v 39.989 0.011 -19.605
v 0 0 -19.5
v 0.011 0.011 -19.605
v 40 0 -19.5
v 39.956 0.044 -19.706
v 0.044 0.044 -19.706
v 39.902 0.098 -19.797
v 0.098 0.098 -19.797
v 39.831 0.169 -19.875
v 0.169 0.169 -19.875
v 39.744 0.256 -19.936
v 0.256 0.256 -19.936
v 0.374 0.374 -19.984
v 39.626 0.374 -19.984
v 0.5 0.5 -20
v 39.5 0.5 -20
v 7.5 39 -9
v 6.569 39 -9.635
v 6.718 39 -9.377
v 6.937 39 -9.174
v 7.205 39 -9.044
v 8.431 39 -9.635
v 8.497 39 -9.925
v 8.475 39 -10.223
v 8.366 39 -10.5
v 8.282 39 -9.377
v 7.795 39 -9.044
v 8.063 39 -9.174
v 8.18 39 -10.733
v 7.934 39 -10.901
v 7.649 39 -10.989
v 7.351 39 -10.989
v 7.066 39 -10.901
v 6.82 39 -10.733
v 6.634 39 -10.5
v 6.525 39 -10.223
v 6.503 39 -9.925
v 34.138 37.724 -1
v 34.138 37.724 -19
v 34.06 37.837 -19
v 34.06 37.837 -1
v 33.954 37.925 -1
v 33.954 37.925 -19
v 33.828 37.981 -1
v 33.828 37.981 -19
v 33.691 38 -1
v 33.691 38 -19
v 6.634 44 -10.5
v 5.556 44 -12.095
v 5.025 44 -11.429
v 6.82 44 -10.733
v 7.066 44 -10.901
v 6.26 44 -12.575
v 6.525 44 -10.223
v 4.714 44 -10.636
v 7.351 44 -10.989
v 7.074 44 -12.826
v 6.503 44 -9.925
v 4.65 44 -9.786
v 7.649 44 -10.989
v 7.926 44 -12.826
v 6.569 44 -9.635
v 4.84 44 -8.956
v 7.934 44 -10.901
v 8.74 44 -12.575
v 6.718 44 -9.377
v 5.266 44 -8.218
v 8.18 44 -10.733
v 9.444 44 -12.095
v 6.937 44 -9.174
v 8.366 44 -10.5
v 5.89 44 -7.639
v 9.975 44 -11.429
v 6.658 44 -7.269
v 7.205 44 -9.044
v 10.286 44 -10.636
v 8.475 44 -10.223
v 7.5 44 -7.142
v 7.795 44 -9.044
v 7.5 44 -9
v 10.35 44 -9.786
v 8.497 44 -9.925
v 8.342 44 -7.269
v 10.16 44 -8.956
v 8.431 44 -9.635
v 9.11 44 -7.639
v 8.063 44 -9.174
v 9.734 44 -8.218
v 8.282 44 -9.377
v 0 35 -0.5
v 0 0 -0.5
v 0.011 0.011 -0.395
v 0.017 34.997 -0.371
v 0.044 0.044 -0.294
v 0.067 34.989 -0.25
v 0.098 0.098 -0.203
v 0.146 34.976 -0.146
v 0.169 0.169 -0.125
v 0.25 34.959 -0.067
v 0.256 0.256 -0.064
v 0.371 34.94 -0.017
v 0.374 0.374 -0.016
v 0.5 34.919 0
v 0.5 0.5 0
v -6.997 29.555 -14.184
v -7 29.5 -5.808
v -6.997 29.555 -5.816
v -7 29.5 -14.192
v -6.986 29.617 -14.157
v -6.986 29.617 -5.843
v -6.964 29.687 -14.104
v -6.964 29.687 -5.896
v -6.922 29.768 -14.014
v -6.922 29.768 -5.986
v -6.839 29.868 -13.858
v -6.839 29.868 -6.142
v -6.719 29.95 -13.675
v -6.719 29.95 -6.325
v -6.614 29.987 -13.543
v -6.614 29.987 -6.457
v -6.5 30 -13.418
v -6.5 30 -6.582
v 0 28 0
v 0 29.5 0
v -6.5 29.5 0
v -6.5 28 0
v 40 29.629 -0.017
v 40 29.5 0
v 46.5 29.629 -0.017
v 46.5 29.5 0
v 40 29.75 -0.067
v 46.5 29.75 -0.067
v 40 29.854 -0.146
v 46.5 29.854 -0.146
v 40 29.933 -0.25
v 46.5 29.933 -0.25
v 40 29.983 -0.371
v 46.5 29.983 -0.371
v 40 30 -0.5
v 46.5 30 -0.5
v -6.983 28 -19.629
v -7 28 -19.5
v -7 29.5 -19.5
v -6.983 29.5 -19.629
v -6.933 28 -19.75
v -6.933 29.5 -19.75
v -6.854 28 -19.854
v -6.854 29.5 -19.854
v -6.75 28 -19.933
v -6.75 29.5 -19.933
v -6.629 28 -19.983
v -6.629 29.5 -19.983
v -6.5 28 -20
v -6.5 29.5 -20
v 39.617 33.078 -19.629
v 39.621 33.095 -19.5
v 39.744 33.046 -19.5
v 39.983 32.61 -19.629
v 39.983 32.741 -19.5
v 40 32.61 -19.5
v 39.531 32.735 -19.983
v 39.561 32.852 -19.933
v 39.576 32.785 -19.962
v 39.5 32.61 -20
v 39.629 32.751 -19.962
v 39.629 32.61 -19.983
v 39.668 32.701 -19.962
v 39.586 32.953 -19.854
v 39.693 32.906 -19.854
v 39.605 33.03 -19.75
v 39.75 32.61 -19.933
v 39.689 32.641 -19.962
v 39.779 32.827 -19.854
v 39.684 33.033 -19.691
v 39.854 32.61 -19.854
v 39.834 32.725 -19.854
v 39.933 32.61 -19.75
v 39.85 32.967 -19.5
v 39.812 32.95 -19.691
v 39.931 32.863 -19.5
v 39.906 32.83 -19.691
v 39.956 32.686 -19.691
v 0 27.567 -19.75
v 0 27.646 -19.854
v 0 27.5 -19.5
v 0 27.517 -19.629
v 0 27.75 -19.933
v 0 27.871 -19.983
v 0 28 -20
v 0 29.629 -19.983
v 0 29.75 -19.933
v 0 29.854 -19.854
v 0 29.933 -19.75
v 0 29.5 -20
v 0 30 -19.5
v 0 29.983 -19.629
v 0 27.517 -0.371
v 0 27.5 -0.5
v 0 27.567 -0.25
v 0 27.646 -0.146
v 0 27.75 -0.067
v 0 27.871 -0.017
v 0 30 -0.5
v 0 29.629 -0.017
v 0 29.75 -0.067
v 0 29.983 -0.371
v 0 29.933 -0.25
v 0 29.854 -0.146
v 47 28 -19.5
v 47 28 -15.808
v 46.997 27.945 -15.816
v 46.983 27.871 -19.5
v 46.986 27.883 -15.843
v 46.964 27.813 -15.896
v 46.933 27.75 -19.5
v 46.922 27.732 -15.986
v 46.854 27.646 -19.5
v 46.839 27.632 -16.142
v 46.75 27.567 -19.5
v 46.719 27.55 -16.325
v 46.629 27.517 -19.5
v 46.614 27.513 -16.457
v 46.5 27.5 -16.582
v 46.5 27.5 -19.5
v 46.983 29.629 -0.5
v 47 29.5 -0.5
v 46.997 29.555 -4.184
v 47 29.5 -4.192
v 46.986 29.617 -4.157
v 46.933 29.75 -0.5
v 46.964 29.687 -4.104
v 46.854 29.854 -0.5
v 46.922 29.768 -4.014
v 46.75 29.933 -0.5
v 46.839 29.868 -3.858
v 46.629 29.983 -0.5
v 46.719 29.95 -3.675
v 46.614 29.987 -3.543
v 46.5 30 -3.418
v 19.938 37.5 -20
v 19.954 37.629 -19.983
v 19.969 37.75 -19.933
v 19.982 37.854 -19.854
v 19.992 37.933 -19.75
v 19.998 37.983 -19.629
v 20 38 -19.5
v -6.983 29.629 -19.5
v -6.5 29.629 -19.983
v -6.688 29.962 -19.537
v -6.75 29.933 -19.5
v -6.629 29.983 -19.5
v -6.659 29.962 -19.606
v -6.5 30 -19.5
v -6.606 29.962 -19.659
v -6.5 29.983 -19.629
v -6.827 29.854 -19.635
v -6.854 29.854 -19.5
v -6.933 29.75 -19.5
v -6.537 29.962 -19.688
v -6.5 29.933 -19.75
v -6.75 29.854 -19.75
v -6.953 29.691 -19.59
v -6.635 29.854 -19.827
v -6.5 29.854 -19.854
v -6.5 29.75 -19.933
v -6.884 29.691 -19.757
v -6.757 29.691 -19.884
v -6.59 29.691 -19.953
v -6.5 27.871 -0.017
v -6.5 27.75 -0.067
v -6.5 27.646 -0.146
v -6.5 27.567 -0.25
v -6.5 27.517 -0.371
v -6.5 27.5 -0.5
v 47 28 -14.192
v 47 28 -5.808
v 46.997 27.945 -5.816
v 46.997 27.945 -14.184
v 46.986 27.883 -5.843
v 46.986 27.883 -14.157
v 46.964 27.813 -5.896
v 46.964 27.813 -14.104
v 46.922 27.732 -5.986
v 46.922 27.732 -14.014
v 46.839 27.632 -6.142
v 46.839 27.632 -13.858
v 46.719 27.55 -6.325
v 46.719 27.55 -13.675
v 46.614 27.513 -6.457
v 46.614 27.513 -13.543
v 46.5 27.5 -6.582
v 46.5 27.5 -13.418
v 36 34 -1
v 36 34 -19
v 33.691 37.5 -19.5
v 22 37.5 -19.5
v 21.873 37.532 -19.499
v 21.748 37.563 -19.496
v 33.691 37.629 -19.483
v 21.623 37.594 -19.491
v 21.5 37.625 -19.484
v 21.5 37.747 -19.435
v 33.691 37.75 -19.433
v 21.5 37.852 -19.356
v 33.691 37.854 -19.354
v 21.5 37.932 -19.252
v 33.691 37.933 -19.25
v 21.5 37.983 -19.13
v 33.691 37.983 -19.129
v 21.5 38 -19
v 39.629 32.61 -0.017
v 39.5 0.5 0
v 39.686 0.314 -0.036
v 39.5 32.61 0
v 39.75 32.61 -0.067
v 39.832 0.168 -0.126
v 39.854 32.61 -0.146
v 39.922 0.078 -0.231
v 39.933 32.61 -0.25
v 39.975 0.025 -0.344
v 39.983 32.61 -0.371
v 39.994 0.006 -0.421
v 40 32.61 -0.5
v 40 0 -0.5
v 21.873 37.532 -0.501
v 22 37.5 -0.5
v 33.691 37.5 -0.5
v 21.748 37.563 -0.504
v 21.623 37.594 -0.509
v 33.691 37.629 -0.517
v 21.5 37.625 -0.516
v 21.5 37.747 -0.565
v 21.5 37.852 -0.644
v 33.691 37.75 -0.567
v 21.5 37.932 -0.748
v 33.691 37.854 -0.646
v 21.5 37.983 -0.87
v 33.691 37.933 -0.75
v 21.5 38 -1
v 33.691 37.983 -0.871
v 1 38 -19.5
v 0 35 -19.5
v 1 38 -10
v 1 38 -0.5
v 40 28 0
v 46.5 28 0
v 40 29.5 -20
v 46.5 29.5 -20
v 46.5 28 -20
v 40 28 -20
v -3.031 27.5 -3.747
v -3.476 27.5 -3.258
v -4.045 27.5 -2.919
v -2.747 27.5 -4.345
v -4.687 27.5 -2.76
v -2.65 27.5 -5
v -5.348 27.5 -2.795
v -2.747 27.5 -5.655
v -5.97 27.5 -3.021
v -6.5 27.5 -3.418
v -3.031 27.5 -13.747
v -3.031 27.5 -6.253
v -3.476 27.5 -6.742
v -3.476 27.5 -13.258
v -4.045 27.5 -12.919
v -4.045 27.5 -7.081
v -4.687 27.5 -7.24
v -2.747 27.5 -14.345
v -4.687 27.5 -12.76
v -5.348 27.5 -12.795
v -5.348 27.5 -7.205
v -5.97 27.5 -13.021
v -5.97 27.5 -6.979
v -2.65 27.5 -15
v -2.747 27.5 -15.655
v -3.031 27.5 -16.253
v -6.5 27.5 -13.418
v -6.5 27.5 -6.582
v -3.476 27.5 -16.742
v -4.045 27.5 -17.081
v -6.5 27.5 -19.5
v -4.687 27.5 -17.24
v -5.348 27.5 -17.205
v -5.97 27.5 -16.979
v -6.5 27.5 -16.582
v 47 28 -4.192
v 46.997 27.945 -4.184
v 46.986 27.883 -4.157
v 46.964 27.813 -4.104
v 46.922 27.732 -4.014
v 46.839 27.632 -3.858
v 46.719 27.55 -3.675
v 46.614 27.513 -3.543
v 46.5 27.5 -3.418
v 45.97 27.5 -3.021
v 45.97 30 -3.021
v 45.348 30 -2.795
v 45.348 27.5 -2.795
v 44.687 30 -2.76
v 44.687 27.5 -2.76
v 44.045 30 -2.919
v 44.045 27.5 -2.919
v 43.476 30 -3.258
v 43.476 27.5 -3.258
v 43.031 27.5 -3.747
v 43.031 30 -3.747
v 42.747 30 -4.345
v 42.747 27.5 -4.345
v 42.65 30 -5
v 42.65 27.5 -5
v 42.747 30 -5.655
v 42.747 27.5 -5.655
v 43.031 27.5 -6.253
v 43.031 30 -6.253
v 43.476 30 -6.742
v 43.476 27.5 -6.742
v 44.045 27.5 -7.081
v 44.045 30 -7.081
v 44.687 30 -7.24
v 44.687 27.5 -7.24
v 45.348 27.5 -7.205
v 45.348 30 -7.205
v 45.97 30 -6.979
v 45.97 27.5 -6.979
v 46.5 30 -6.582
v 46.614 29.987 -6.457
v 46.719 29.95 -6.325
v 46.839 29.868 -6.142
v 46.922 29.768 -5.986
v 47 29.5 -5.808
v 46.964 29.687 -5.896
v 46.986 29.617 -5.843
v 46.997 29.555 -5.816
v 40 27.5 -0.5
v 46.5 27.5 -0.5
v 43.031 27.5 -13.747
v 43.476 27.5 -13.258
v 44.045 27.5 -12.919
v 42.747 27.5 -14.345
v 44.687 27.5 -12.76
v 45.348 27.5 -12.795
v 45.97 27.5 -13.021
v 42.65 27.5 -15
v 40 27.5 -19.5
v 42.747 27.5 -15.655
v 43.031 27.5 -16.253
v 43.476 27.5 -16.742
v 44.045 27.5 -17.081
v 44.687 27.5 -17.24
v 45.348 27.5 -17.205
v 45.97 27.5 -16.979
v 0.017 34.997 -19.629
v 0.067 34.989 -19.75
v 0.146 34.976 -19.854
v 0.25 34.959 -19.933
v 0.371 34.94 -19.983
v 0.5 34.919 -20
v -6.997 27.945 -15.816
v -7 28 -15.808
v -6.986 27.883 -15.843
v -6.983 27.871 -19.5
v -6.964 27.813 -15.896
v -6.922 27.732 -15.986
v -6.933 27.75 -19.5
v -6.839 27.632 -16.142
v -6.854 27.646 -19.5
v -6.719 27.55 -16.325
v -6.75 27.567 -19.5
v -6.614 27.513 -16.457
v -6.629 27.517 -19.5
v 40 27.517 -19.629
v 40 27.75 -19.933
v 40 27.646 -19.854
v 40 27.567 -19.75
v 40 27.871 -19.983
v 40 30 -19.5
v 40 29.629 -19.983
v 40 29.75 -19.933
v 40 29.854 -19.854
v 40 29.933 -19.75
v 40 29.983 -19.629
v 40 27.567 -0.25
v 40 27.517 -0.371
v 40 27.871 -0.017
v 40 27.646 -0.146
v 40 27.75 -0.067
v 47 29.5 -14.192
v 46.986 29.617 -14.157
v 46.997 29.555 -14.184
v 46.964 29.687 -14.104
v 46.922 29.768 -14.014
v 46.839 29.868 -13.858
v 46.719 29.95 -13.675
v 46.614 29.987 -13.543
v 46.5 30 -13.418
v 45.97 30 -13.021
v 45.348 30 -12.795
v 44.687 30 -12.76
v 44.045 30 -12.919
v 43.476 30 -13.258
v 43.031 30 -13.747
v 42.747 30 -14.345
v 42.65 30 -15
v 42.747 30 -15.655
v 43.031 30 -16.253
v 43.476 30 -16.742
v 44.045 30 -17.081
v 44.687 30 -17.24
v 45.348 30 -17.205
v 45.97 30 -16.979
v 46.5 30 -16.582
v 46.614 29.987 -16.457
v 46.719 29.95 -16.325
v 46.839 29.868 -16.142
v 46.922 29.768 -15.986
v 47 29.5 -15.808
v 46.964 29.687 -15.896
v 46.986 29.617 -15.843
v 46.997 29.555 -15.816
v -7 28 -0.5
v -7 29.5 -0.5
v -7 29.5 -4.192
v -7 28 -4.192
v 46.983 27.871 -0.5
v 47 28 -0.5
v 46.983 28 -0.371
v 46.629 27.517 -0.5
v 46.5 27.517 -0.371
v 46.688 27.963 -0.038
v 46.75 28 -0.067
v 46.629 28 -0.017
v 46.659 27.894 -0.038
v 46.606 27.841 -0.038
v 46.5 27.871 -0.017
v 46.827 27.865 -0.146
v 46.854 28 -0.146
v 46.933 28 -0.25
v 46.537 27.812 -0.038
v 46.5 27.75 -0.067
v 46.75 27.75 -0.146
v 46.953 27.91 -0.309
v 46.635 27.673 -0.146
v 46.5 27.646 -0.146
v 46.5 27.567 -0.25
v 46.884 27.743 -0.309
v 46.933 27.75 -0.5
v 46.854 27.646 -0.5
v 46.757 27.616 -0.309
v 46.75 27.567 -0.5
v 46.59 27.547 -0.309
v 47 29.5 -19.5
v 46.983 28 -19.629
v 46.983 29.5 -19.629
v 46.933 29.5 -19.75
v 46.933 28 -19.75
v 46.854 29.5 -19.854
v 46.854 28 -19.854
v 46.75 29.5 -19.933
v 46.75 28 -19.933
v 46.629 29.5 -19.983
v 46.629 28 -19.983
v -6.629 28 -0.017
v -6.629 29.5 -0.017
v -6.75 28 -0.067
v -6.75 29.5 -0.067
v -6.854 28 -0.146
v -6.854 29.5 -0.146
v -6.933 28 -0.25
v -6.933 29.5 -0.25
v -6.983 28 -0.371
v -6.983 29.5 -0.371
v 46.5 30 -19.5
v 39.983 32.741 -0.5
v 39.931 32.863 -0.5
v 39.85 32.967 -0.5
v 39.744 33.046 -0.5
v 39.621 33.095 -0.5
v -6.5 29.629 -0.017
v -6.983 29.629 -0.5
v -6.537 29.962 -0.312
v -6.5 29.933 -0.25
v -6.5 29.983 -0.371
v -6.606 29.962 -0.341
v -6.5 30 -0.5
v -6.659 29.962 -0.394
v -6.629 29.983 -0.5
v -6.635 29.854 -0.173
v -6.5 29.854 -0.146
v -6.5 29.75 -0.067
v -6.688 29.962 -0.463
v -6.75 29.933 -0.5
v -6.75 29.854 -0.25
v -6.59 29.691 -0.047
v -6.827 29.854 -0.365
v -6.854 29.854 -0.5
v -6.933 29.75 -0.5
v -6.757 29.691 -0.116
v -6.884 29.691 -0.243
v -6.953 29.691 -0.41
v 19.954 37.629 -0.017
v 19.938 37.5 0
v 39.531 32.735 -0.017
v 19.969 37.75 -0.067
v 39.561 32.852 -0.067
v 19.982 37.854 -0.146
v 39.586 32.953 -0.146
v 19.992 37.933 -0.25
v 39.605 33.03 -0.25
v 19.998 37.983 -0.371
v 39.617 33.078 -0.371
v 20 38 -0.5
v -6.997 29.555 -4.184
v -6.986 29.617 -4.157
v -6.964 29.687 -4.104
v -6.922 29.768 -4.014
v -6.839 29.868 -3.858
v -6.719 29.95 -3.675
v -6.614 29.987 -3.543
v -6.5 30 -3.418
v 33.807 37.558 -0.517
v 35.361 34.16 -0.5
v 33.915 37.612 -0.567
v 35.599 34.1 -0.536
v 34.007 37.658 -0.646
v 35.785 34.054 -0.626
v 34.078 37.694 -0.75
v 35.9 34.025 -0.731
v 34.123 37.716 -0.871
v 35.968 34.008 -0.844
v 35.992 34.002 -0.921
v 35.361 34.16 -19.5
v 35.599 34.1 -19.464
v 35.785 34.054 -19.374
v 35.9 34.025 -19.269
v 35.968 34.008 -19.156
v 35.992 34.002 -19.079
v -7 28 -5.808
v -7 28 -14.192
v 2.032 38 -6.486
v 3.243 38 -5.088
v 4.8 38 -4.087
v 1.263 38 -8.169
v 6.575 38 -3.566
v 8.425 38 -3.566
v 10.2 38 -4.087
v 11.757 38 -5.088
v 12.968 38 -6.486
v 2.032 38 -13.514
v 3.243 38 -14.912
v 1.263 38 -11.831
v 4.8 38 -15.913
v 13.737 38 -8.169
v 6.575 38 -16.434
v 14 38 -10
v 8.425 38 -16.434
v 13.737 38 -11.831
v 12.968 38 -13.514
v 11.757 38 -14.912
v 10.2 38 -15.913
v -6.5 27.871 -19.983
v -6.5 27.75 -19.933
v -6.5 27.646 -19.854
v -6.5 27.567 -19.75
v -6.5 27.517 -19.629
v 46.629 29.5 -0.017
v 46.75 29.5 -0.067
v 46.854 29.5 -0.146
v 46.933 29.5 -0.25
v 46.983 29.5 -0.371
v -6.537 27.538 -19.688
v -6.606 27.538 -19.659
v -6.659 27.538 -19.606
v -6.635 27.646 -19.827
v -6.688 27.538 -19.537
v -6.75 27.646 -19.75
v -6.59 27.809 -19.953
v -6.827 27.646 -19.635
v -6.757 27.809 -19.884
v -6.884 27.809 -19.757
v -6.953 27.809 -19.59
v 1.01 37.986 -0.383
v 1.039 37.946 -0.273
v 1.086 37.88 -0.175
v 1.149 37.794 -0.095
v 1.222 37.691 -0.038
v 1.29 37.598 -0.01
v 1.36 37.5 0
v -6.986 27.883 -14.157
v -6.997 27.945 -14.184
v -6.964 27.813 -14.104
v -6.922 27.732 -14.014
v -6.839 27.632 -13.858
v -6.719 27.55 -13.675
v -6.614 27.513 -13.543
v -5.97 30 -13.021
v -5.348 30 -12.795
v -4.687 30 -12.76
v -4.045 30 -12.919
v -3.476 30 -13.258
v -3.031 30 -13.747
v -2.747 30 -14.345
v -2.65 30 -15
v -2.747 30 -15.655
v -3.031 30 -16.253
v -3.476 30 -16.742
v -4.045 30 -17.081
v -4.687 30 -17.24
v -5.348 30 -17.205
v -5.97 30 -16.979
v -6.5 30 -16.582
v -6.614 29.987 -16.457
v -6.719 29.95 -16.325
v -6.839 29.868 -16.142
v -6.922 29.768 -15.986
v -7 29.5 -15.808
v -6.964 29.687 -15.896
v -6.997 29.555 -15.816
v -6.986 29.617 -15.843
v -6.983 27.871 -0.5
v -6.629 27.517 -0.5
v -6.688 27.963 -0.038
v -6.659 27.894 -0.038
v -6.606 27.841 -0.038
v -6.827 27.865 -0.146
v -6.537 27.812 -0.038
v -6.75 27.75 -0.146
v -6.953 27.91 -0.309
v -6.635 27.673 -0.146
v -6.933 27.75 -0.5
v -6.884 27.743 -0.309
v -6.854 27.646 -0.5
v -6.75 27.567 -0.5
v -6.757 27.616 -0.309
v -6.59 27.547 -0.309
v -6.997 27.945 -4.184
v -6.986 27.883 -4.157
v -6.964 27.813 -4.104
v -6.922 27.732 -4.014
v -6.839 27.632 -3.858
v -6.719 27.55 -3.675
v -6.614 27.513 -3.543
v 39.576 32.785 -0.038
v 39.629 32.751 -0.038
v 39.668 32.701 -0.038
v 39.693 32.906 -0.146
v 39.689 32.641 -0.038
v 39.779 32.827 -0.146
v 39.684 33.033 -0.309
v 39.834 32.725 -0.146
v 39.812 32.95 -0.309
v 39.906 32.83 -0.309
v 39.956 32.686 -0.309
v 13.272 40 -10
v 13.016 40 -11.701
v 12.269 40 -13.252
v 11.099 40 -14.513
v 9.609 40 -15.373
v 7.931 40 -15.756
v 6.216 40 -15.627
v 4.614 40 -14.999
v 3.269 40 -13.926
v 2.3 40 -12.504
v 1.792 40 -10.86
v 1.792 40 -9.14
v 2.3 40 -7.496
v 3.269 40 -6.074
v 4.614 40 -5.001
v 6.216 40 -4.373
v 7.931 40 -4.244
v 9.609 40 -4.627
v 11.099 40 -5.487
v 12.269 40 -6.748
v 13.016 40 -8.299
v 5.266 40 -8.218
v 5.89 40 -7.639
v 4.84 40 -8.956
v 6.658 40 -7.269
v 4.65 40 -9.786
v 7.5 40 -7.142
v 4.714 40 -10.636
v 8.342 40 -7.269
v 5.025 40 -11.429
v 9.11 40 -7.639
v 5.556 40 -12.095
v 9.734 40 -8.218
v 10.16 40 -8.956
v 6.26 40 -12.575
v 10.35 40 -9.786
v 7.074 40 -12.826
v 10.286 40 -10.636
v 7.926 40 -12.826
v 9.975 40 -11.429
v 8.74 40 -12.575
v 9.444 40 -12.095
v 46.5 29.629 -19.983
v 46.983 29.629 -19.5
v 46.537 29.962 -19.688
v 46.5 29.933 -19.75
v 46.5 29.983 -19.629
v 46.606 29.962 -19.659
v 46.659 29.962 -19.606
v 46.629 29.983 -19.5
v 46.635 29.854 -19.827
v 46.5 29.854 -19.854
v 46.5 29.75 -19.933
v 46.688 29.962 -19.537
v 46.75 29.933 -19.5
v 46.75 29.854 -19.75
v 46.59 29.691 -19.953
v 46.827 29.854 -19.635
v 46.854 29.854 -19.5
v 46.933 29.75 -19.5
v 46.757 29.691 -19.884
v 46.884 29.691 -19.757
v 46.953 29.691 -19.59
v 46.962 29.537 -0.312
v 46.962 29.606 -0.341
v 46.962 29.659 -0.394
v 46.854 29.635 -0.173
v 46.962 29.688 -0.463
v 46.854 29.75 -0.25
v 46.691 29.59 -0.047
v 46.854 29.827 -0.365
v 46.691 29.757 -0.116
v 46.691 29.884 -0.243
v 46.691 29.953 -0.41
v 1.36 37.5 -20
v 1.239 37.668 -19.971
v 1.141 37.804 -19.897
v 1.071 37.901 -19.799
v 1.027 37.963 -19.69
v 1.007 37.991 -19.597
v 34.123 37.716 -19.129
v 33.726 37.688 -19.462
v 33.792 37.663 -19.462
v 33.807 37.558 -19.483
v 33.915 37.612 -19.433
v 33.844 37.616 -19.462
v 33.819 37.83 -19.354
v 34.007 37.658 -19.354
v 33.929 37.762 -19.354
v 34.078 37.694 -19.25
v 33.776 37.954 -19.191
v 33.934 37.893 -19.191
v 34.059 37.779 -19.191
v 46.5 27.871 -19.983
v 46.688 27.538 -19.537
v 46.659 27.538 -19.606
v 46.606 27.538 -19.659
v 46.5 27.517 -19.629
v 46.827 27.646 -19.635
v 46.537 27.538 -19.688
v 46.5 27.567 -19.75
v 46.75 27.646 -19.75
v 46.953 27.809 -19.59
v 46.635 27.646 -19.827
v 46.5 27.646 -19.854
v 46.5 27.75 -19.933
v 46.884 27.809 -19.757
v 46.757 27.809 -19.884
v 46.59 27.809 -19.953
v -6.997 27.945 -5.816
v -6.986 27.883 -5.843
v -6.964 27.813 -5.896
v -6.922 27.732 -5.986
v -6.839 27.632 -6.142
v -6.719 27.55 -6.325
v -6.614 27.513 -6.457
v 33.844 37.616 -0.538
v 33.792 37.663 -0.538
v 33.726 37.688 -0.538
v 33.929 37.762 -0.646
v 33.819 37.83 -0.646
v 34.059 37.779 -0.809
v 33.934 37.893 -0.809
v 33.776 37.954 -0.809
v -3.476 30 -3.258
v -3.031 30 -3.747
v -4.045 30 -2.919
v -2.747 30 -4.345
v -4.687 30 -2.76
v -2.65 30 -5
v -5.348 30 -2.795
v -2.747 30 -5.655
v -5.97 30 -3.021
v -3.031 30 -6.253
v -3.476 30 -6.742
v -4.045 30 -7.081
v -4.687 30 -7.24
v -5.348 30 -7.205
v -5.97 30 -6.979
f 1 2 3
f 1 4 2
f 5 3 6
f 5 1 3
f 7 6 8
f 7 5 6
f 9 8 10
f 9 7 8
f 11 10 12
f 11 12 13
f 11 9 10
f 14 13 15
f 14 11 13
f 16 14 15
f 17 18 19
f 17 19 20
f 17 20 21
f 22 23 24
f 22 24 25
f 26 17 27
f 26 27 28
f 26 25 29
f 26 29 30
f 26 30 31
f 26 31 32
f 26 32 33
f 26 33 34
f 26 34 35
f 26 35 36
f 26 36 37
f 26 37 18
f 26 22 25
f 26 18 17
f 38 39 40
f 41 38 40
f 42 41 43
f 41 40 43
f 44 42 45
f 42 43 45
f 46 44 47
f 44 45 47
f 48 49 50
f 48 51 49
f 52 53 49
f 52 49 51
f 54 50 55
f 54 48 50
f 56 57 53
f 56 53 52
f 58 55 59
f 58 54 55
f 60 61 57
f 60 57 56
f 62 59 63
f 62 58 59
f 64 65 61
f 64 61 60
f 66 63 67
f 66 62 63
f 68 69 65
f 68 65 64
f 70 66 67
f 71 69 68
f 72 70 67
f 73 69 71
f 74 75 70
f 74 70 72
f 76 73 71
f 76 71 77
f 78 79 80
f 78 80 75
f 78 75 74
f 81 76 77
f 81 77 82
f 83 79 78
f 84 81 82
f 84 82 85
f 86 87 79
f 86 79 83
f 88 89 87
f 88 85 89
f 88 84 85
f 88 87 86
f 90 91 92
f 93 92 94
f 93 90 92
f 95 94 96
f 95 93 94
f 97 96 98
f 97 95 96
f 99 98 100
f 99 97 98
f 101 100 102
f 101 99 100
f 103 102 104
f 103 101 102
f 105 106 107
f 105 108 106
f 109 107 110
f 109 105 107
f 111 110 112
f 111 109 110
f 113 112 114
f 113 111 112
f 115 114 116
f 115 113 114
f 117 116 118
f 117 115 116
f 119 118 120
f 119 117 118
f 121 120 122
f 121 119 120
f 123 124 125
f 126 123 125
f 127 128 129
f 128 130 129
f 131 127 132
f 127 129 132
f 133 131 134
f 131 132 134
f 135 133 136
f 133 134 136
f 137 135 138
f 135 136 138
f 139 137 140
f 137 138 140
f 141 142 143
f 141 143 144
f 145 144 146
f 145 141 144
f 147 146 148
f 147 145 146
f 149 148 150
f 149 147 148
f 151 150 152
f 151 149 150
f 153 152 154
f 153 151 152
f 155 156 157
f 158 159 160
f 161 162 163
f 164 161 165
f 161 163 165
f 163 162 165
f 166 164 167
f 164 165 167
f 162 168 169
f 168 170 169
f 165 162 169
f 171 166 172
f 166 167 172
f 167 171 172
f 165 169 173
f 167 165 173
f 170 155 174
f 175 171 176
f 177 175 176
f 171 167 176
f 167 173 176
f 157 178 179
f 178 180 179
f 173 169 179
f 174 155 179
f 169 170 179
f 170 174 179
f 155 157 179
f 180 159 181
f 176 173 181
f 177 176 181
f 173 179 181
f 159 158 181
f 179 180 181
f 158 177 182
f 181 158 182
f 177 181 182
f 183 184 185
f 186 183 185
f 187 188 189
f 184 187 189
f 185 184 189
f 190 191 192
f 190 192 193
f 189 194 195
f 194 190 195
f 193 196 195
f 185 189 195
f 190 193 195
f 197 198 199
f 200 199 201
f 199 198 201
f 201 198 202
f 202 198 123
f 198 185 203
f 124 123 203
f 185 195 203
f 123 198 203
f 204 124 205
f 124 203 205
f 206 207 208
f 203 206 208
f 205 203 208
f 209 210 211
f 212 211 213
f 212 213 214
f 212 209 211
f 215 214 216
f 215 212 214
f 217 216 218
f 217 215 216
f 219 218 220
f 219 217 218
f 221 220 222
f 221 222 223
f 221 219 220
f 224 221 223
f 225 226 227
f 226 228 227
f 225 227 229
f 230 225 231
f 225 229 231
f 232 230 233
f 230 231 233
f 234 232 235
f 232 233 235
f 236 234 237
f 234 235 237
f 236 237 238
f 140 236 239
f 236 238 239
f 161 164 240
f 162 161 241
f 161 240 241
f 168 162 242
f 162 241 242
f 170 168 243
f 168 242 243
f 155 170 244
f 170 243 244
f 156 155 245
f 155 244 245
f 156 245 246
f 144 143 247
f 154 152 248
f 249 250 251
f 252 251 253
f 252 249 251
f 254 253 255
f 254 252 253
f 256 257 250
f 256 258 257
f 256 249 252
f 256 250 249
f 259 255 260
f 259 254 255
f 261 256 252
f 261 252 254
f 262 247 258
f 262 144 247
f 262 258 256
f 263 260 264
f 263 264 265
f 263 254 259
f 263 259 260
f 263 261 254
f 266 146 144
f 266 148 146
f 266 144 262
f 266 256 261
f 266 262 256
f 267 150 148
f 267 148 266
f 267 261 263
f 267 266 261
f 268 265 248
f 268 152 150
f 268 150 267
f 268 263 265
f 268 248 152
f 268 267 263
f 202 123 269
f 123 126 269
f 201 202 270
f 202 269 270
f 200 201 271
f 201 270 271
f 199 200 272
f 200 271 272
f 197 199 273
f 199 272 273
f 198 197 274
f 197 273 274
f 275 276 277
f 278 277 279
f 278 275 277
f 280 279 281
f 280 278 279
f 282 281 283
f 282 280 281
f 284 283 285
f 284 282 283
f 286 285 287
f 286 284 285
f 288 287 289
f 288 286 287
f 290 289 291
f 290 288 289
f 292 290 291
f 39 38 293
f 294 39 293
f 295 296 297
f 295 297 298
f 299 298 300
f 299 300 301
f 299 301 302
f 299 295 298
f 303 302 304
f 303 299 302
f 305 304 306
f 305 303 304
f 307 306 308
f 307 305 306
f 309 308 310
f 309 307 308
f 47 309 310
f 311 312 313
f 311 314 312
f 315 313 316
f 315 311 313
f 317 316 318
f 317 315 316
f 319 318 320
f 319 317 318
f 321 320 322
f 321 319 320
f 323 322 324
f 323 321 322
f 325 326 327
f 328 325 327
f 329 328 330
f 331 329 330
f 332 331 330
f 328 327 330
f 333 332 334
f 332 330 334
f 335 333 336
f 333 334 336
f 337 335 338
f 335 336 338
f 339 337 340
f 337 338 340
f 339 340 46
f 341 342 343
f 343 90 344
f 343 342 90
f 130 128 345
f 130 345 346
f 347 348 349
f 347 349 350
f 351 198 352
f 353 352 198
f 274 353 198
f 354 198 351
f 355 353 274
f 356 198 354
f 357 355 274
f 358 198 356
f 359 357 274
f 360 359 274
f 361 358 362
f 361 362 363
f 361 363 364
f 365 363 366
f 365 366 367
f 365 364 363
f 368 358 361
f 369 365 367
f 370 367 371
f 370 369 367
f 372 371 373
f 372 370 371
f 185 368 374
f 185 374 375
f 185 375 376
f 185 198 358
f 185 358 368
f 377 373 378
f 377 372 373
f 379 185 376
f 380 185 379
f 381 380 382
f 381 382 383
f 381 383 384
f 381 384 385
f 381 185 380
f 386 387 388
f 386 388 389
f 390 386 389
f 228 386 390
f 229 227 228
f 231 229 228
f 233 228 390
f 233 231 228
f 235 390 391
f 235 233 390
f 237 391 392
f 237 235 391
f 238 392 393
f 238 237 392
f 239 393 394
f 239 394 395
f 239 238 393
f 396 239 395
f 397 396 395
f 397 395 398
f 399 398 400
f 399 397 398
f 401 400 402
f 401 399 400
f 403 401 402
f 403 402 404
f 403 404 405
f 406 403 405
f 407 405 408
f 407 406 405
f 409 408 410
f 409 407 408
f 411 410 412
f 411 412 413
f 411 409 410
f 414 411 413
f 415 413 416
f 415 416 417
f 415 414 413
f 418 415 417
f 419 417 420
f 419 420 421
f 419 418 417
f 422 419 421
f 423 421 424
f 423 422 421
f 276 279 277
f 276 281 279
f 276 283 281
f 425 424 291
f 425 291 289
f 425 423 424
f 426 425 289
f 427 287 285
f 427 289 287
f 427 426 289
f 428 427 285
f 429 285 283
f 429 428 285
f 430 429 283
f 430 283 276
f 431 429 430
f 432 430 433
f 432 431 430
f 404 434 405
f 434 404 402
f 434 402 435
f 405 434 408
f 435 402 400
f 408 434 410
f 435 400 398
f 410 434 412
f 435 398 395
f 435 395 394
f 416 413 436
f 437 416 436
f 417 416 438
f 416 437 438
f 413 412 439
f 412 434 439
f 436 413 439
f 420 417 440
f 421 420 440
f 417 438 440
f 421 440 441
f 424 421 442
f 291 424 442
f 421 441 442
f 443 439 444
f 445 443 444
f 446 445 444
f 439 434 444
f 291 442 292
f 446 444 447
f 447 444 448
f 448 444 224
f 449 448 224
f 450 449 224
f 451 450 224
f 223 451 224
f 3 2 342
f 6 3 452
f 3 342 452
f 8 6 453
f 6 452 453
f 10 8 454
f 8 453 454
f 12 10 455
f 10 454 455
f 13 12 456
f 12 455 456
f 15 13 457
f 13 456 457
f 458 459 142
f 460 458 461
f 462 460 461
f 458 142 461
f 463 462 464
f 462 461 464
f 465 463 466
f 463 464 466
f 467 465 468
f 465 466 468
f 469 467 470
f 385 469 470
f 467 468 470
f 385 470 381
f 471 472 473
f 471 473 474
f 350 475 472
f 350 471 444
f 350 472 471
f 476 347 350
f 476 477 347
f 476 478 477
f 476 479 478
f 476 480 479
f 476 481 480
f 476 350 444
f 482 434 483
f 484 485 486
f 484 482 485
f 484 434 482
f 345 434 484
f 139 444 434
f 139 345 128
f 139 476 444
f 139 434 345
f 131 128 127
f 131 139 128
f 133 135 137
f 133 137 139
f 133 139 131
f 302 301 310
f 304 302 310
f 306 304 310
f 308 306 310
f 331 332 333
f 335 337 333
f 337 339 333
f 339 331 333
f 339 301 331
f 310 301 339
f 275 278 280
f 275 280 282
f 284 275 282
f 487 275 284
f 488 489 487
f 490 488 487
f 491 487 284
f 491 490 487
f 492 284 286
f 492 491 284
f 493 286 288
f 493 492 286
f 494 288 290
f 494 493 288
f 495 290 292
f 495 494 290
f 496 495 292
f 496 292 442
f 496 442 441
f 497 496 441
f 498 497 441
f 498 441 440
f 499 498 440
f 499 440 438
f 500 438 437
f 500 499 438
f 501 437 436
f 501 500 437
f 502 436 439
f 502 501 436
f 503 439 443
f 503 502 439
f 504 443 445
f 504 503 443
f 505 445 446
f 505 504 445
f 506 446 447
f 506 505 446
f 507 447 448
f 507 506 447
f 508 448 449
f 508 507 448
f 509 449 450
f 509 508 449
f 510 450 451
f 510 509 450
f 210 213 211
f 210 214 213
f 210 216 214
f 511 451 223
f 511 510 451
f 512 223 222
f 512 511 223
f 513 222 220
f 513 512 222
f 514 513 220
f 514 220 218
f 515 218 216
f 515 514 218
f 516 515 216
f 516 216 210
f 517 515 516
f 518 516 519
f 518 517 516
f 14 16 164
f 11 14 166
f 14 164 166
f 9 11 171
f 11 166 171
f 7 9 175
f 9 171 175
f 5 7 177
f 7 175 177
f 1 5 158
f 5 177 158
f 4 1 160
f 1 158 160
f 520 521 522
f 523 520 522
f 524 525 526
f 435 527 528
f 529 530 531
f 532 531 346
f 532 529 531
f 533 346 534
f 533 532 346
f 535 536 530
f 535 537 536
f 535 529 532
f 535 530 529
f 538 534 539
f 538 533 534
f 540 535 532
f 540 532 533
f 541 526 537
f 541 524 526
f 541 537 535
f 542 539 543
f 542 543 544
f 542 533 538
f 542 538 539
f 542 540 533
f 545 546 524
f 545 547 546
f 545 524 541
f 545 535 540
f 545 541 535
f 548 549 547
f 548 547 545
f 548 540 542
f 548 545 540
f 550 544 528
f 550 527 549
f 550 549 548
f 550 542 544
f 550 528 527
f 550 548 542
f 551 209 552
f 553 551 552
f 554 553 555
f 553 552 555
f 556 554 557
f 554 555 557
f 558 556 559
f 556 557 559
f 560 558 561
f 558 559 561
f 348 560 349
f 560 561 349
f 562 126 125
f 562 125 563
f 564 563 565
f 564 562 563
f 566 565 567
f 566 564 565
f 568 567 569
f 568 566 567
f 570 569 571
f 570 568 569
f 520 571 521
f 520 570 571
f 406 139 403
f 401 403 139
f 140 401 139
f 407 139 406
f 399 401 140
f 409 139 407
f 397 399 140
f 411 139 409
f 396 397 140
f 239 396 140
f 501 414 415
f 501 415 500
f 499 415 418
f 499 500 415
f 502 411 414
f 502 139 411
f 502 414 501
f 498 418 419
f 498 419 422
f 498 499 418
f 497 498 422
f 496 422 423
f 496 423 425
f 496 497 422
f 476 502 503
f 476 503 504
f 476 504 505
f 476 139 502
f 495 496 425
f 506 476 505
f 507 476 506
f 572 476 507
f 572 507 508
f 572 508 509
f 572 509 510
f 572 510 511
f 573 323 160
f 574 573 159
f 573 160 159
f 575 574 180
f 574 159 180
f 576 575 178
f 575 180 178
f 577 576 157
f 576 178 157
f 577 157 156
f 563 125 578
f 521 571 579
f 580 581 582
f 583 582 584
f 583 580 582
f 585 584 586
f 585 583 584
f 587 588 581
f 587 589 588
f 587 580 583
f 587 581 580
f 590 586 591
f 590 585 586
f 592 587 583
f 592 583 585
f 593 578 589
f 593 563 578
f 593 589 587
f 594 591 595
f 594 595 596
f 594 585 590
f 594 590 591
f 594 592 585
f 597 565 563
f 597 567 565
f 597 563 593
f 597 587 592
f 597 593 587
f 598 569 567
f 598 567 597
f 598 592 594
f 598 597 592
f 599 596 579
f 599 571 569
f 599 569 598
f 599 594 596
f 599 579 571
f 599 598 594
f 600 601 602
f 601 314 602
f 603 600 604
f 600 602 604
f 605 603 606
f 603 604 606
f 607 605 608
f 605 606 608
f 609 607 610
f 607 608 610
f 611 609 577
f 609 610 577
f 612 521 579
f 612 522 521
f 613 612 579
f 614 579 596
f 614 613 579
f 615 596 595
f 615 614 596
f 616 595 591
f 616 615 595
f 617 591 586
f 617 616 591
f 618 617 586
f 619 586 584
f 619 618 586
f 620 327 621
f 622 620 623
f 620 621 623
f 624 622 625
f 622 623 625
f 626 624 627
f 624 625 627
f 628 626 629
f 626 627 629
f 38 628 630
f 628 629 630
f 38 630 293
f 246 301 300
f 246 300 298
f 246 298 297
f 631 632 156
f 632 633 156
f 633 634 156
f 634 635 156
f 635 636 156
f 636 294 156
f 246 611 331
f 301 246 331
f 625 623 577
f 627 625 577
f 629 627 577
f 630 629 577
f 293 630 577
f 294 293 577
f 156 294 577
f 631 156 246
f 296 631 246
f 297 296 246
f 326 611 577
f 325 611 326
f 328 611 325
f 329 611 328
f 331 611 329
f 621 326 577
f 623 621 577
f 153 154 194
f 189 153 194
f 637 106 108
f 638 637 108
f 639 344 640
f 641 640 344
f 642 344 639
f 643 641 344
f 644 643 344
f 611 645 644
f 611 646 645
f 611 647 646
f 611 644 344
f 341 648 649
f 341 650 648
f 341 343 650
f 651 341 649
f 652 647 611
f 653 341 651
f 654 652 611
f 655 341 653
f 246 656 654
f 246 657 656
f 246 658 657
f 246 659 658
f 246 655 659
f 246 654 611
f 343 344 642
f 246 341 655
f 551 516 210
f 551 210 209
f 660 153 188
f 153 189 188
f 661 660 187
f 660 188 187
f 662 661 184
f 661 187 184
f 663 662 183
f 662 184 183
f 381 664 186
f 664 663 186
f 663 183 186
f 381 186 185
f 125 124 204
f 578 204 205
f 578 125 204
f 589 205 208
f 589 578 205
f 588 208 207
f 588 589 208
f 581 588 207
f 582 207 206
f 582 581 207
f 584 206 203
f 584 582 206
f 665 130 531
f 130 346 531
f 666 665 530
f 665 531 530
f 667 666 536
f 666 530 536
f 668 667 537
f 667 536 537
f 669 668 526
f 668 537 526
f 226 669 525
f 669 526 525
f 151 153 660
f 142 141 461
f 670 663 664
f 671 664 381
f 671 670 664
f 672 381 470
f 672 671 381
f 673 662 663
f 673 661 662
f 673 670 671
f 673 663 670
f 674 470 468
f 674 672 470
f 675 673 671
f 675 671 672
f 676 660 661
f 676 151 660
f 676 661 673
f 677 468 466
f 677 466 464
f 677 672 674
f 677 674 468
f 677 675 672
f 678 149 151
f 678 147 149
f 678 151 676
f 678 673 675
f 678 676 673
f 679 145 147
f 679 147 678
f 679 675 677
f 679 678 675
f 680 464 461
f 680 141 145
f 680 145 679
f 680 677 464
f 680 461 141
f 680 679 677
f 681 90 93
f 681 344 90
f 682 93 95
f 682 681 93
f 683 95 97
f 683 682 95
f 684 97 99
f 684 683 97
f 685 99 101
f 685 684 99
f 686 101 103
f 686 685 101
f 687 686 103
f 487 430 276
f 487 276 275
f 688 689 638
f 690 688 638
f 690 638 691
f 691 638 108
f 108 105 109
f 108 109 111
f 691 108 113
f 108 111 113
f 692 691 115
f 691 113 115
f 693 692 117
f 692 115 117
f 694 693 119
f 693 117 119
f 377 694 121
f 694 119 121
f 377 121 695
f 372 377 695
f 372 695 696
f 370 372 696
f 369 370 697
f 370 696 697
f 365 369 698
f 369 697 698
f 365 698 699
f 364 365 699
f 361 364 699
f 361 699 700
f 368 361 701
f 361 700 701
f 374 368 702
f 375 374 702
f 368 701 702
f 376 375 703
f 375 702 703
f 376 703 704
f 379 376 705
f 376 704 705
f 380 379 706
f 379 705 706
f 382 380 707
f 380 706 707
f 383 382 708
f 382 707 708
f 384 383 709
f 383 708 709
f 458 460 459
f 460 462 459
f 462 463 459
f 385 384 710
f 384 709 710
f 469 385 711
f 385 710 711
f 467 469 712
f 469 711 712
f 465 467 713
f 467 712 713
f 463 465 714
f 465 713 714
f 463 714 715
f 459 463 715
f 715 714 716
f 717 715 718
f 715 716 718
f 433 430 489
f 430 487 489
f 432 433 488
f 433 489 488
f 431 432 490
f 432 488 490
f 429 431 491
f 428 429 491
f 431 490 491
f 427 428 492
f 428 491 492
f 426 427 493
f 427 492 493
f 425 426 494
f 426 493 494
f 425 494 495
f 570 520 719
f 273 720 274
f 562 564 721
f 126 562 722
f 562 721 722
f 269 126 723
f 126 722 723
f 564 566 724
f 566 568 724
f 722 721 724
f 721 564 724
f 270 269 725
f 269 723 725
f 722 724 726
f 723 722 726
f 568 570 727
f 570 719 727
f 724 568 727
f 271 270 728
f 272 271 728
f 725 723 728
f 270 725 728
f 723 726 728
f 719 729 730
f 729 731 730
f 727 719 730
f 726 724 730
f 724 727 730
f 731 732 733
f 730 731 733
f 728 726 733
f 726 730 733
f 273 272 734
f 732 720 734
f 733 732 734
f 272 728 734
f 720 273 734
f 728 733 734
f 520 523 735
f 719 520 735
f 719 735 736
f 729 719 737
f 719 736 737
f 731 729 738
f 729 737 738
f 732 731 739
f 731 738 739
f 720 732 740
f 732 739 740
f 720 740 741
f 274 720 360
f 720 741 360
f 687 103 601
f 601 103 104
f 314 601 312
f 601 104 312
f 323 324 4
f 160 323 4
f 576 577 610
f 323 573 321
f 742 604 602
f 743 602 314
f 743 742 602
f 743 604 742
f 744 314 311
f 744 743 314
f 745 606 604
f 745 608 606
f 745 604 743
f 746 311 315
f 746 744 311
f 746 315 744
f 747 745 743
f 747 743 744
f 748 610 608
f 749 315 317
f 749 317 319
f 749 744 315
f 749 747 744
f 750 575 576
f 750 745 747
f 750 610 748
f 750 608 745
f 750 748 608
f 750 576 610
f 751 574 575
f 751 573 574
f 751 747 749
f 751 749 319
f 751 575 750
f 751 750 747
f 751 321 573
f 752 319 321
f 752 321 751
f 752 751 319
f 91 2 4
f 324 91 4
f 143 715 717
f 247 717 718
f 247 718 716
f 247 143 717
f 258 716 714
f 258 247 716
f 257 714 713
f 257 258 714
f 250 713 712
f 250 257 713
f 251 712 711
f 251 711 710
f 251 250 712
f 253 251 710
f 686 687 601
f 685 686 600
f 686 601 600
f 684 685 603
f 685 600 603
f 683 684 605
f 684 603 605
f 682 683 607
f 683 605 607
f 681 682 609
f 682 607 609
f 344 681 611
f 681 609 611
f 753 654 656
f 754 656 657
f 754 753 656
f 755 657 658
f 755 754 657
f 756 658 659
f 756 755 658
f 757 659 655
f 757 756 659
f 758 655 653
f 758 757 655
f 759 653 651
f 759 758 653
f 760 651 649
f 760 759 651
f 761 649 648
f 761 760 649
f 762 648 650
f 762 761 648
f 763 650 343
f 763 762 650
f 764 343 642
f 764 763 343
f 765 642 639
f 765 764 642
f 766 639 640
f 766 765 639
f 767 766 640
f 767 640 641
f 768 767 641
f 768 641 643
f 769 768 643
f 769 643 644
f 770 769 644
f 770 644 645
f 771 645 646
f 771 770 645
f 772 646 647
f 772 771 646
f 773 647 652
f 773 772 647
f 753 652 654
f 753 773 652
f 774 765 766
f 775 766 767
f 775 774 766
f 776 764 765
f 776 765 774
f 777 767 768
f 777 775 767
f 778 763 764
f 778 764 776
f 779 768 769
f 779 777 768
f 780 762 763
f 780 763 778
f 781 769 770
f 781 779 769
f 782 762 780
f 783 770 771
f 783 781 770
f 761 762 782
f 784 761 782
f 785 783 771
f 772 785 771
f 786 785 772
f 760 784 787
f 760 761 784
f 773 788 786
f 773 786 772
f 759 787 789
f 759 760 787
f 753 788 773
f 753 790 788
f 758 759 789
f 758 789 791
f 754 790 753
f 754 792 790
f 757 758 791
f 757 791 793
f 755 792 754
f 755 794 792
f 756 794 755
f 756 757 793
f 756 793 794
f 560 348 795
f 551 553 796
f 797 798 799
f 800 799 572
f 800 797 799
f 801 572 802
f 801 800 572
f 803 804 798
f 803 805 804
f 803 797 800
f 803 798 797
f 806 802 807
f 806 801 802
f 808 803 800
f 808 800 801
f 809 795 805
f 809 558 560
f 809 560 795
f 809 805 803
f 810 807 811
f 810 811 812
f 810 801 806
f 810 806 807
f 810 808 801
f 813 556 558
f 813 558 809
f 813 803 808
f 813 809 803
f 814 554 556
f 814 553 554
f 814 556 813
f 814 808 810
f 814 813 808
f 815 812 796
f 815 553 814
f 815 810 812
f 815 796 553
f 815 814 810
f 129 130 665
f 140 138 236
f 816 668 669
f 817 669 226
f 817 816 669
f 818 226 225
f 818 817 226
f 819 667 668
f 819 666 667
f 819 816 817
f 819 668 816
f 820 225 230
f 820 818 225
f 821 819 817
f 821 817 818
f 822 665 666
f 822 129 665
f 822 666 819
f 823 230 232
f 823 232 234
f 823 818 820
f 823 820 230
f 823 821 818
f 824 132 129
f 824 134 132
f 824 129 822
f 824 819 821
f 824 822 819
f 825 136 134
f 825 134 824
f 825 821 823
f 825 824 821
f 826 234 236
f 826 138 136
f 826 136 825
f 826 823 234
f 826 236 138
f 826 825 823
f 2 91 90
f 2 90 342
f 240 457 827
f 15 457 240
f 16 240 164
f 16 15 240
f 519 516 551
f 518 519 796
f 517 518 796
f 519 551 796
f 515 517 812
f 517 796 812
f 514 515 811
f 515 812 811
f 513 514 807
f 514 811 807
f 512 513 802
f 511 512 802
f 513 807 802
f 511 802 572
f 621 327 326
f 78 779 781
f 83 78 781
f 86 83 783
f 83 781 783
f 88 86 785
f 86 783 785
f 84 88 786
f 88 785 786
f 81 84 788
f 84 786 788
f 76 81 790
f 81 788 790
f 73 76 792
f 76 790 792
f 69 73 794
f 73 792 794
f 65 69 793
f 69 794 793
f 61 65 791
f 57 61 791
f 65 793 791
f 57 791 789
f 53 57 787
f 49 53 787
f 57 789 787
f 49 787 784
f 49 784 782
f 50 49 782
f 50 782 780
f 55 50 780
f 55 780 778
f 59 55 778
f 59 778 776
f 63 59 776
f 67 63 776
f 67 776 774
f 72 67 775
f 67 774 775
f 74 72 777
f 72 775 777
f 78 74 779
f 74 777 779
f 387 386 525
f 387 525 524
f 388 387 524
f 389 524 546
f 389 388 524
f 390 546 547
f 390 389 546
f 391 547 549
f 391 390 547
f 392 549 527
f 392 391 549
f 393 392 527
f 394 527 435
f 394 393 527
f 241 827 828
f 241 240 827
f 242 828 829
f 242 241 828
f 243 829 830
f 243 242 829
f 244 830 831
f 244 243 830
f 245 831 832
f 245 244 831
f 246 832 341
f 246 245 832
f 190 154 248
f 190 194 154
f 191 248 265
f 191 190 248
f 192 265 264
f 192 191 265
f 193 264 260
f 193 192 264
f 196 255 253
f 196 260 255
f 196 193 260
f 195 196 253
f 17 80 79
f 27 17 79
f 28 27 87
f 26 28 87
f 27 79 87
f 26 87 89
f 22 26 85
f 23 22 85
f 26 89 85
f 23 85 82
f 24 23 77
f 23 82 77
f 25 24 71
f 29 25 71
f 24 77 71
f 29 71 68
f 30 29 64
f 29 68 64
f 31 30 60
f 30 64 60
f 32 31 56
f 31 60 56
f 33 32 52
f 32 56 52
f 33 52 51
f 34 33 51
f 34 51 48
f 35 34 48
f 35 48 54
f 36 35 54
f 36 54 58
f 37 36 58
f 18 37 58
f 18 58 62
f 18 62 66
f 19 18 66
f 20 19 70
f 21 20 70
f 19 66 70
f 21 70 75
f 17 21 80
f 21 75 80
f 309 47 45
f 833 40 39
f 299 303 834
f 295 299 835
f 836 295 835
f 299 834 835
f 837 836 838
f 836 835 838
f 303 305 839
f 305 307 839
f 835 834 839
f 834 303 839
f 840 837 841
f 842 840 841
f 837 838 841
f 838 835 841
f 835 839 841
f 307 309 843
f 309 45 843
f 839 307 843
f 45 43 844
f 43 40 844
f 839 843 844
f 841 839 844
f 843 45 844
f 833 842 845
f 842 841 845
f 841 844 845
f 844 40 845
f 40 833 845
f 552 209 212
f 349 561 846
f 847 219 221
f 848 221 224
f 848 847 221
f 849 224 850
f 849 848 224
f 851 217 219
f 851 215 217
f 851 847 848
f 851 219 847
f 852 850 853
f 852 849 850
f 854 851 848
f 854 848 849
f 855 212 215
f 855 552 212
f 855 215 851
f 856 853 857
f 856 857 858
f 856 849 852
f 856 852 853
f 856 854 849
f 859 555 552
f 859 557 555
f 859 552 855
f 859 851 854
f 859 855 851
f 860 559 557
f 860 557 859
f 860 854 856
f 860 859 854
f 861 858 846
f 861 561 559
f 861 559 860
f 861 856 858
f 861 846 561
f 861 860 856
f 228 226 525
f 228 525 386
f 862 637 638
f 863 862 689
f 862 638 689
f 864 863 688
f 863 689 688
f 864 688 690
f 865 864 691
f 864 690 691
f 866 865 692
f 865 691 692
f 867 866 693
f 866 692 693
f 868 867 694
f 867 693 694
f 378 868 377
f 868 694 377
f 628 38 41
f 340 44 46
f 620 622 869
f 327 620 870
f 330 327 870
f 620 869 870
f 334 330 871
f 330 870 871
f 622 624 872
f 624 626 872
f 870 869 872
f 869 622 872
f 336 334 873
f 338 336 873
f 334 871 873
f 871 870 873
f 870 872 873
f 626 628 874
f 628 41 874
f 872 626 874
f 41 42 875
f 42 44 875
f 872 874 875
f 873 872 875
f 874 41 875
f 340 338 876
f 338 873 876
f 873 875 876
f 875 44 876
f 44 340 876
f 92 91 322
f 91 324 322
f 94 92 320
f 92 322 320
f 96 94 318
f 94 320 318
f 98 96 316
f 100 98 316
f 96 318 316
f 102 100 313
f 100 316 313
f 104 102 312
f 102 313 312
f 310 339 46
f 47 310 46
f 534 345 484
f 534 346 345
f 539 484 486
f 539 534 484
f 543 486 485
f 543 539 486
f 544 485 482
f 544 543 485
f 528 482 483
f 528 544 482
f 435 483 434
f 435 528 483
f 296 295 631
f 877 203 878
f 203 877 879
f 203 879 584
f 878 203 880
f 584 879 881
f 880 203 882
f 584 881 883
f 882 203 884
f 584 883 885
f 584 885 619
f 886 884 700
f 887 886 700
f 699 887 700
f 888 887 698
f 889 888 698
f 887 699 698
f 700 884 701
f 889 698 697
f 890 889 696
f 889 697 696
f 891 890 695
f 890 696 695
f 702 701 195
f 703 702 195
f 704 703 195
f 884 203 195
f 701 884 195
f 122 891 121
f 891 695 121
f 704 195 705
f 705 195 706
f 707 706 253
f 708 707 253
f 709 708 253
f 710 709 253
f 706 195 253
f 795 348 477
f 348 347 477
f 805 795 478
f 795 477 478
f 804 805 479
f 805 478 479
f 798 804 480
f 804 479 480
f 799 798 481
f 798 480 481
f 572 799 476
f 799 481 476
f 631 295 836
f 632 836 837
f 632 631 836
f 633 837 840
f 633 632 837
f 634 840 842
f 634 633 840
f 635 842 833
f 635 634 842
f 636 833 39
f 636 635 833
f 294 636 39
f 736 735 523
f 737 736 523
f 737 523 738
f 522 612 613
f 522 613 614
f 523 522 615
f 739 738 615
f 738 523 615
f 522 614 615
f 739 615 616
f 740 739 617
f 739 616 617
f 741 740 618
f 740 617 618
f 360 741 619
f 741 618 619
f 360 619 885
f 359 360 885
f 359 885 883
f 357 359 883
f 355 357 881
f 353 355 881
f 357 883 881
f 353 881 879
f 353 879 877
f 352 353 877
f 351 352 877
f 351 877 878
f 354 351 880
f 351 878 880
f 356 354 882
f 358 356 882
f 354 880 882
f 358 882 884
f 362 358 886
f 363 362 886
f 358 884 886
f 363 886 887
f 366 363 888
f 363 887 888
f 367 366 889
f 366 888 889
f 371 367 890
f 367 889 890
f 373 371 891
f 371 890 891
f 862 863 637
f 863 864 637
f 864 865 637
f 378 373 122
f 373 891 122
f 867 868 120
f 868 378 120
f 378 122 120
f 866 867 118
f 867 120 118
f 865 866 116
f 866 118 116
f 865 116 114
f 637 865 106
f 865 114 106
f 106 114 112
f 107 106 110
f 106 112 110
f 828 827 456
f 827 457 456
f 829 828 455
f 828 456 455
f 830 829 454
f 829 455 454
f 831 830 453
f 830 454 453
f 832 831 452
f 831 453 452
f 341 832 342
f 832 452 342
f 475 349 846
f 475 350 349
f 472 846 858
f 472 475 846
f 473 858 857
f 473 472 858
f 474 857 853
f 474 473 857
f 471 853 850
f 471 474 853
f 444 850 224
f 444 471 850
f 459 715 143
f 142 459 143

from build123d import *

# Parameters (mm, degrees)
SKETCH2_W             = 40
SKETCH2_H             = 20
BOSS_EXTRUDE1_DEPTH   = 38
SKETCH3_R             = 6.5
BOSS_EXTRUDE2_DEPTH   = 2
BOSS_EXTRUDE2_TAPER   = 20
SKETCH4_R             = 2.8575
BOSS_EXTRUDE3_DEPTH   = 4
SKETCH5_R             = 1
CUT_EXTRUDE1_DEPTH    = 5
BOSS_EXTRUDE6_START   = -8
BOSS_EXTRUDE6_DEPTH   = 2.5
BOSS_EXTRUDE6_2_DEPTH = 2.5
CUT_EXTRUDE5_DEPTH    = 68.416615163
BOSS_EXTRUDE7_START   = -0.5
BOSS_EXTRUDE7_DEPTH   = 19
FILLET1_R             = 0.5
FILLET3_R             = 0.5
FILLET4_R             = 0.5


with BuildPart() as part:
    # Sketch2 → Boss-Extrude1 (new body)
    with BuildSketch(Plane(origin=(0, 0, 0), x_dir=(1, 0, 0), z_dir=(0, 1, 0))):
        with Locations((20, 10)):
            Rectangle(SKETCH2_W, SKETCH2_H)
    extrude(amount=BOSS_EXTRUDE1_DEPTH)

    # Sketch3 → Boss-Extrude2 (add)
    with BuildSketch(Plane(origin=(0, 38, 0), x_dir=(1, 0, 0), z_dir=(0, 1, 0))):
        with Locations((7.5, 10)):
            Circle(SKETCH3_R)
    extrude(amount=BOSS_EXTRUDE2_DEPTH, taper=BOSS_EXTRUDE2_TAPER)

    # Sketch4 → Boss-Extrude3 (add)
    with BuildSketch(Plane(origin=(0, 40, 0), x_dir=(1, 0, 0), z_dir=(0, 1, 0))):
        with Locations(Location((7.5, 10, 0), (0, 0, 270))):
            Circle(SKETCH4_R)
    extrude(amount=BOSS_EXTRUDE3_DEPTH)

    # Sketch5 → Cut-Extrude1 (cut)
    with BuildSketch(Plane(origin=(0, 44, 0), x_dir=(1, 0, 0), z_dir=(0, 1, 0))):
        with Locations(Location((7.5, 10, 0), (0, 0, 270))):
            Circle(SKETCH5_R)
    extrude(amount=-CUT_EXTRUDE1_DEPTH, mode=Mode.SUBTRACT)

    # Sketch8 → Cut-Extrude5 (cut, through all)
    with BuildSketch(Plane.XY):
        Polygon((20, 38), (40, 33), (40, 38), align=None)
        Polygon((0, 38), (0, 35), (1, 38), align=None)
    extrude(amount=-CUT_EXTRUDE5_DEPTH, mode=Mode.SUBTRACT)

    # Sketch9 → Boss-Extrude7 (add)
    with BuildSketch(Plane.XY.offset(BOSS_EXTRUDE7_START)):
        Polygon((21.5, 38), (34, 38), (36, 34), (21.5, 37.625), align=None)
    extrude(amount=-BOSS_EXTRUDE7_DEPTH)

    # Fillet1
    fillet1_edges = [part.edges().sort_by_distance(p)[0] for p in [
        (30, 35.5, 0),
        (40, 16.5, 0),
        (20, 0, 0),
        (0, 17.5, 0),
        (0.5, 36.5, 0),
        (10.5, 38, 0),
        (34, 38, -10),
        (40, 33, -10),
        (27.75, 38, -19.5),
        (35, 36, -19.5),
        (35, 36, -0.5),
        (27.75, 38, -0.5),
        (0.5, 36.5, -20),
        (20, 0, -20),
        (30, 35.5, -20),
        (10.5, 38, -20),
        (0, 17.5, -20),
        (40, 16.5, -20),
    ]]
    fillet(fillet1_edges, radius=FILLET1_R - 0.0001)  # a hair under: the kernel refuses the full size


with BuildPart() as body_2:
    # Sketch6 → Boss-Extrude6 (new body)
    with BuildSketch(Plane(origin=(0, 38, 0), x_dir=(1, 0, 0), z_dir=(0, 1, 0)).offset(BOSS_EXTRUDE6_START)):
        with BuildLine():
            Line((40, 0), (47, 0))
            Line((47, 0), (47, 4.192225279))
            ThreePointArc((47, 4.192225279), (42.65, 5), (47, 5.807774721))
            Line((47, 5.807774721), (47, 14.192225279))
            ThreePointArc((47, 14.192225279), (42.65, 15), (47, 15.807774721))
            Line((47, 15.807774721), (47, 20))
            Line((47, 20), (40, 20))
            Line((40, 20), (40, 0))
        make_face()
    extrude(amount=-BOSS_EXTRUDE6_DEPTH)

    # Fillet4
    fillet4_edges = [body_2.edges().sort_by_distance(p)[0] for p in [
        (47, 27.5, -2.096112639),
        (43.5, 30, 0),
        (47, 28.75, -20),
        (47, 28.75, 0),
        (47, 27.5, -10),
        (47, 27.5, -17.903887361),
        (43.5, 27.5, -20),
        (43.5, 27.5, 0),
        (43.5, 30, -20),
        (47, 30, -17.903887361),
        (47, 30, -10),
        (47, 30, -2.096112639),
    ]]
    fillet(fillet4_edges, radius=FILLET4_R)


with BuildPart() as body_3:
    # Sketch6 → Boss-Extrude6 2 (new body)
    with BuildSketch(Plane(origin=(0, 38, 0), x_dir=(1, 0, 0), z_dir=(0, 1, 0)).offset(BOSS_EXTRUDE6_START)):
        with BuildLine():
            Line((-7, 15.807774721), (-7, 20))
            Line((-7, 20), (0, 20))
            Line((0, 20), (0, 0))
            Line((0, 0), (-7, 0))
            Line((-7, 0), (-7, 4.192225279))
            ThreePointArc((-7, 4.192225279), (-2.65, 5), (-7, 5.807774721))
            Line((-7, 5.807774721), (-7, 14.192225279))
            ThreePointArc((-7, 14.192225279), (-2.65, 15), (-7, 15.807774721))
        make_face()
    extrude(amount=-BOSS_EXTRUDE6_2_DEPTH)

    # Fillet3
    fillet3_edges = [body_3.edges().sort_by_distance(p)[0] for p in [
        (-7, 30, -10),
        (-7, 27.5, -2.096112639),
        (-7, 28.75, -20),
        (-7, 28.75, 0),
        (-3.5, 27.5, 0),
        (-3.5, 27.5, -20),
        (-7, 27.5, -17.903887361),
        (-7, 27.5, -10),
        (-7, 30, -17.903887361),
        (-3.5, 30, -20),
        (-3.5, 30, 0),
        (-7, 30, -2.096112639),
    ]]
    fillet(fillet3_edges, radius=FILLET3_R)


solid = Compound([part.part, body_2.part, body_3.part])
